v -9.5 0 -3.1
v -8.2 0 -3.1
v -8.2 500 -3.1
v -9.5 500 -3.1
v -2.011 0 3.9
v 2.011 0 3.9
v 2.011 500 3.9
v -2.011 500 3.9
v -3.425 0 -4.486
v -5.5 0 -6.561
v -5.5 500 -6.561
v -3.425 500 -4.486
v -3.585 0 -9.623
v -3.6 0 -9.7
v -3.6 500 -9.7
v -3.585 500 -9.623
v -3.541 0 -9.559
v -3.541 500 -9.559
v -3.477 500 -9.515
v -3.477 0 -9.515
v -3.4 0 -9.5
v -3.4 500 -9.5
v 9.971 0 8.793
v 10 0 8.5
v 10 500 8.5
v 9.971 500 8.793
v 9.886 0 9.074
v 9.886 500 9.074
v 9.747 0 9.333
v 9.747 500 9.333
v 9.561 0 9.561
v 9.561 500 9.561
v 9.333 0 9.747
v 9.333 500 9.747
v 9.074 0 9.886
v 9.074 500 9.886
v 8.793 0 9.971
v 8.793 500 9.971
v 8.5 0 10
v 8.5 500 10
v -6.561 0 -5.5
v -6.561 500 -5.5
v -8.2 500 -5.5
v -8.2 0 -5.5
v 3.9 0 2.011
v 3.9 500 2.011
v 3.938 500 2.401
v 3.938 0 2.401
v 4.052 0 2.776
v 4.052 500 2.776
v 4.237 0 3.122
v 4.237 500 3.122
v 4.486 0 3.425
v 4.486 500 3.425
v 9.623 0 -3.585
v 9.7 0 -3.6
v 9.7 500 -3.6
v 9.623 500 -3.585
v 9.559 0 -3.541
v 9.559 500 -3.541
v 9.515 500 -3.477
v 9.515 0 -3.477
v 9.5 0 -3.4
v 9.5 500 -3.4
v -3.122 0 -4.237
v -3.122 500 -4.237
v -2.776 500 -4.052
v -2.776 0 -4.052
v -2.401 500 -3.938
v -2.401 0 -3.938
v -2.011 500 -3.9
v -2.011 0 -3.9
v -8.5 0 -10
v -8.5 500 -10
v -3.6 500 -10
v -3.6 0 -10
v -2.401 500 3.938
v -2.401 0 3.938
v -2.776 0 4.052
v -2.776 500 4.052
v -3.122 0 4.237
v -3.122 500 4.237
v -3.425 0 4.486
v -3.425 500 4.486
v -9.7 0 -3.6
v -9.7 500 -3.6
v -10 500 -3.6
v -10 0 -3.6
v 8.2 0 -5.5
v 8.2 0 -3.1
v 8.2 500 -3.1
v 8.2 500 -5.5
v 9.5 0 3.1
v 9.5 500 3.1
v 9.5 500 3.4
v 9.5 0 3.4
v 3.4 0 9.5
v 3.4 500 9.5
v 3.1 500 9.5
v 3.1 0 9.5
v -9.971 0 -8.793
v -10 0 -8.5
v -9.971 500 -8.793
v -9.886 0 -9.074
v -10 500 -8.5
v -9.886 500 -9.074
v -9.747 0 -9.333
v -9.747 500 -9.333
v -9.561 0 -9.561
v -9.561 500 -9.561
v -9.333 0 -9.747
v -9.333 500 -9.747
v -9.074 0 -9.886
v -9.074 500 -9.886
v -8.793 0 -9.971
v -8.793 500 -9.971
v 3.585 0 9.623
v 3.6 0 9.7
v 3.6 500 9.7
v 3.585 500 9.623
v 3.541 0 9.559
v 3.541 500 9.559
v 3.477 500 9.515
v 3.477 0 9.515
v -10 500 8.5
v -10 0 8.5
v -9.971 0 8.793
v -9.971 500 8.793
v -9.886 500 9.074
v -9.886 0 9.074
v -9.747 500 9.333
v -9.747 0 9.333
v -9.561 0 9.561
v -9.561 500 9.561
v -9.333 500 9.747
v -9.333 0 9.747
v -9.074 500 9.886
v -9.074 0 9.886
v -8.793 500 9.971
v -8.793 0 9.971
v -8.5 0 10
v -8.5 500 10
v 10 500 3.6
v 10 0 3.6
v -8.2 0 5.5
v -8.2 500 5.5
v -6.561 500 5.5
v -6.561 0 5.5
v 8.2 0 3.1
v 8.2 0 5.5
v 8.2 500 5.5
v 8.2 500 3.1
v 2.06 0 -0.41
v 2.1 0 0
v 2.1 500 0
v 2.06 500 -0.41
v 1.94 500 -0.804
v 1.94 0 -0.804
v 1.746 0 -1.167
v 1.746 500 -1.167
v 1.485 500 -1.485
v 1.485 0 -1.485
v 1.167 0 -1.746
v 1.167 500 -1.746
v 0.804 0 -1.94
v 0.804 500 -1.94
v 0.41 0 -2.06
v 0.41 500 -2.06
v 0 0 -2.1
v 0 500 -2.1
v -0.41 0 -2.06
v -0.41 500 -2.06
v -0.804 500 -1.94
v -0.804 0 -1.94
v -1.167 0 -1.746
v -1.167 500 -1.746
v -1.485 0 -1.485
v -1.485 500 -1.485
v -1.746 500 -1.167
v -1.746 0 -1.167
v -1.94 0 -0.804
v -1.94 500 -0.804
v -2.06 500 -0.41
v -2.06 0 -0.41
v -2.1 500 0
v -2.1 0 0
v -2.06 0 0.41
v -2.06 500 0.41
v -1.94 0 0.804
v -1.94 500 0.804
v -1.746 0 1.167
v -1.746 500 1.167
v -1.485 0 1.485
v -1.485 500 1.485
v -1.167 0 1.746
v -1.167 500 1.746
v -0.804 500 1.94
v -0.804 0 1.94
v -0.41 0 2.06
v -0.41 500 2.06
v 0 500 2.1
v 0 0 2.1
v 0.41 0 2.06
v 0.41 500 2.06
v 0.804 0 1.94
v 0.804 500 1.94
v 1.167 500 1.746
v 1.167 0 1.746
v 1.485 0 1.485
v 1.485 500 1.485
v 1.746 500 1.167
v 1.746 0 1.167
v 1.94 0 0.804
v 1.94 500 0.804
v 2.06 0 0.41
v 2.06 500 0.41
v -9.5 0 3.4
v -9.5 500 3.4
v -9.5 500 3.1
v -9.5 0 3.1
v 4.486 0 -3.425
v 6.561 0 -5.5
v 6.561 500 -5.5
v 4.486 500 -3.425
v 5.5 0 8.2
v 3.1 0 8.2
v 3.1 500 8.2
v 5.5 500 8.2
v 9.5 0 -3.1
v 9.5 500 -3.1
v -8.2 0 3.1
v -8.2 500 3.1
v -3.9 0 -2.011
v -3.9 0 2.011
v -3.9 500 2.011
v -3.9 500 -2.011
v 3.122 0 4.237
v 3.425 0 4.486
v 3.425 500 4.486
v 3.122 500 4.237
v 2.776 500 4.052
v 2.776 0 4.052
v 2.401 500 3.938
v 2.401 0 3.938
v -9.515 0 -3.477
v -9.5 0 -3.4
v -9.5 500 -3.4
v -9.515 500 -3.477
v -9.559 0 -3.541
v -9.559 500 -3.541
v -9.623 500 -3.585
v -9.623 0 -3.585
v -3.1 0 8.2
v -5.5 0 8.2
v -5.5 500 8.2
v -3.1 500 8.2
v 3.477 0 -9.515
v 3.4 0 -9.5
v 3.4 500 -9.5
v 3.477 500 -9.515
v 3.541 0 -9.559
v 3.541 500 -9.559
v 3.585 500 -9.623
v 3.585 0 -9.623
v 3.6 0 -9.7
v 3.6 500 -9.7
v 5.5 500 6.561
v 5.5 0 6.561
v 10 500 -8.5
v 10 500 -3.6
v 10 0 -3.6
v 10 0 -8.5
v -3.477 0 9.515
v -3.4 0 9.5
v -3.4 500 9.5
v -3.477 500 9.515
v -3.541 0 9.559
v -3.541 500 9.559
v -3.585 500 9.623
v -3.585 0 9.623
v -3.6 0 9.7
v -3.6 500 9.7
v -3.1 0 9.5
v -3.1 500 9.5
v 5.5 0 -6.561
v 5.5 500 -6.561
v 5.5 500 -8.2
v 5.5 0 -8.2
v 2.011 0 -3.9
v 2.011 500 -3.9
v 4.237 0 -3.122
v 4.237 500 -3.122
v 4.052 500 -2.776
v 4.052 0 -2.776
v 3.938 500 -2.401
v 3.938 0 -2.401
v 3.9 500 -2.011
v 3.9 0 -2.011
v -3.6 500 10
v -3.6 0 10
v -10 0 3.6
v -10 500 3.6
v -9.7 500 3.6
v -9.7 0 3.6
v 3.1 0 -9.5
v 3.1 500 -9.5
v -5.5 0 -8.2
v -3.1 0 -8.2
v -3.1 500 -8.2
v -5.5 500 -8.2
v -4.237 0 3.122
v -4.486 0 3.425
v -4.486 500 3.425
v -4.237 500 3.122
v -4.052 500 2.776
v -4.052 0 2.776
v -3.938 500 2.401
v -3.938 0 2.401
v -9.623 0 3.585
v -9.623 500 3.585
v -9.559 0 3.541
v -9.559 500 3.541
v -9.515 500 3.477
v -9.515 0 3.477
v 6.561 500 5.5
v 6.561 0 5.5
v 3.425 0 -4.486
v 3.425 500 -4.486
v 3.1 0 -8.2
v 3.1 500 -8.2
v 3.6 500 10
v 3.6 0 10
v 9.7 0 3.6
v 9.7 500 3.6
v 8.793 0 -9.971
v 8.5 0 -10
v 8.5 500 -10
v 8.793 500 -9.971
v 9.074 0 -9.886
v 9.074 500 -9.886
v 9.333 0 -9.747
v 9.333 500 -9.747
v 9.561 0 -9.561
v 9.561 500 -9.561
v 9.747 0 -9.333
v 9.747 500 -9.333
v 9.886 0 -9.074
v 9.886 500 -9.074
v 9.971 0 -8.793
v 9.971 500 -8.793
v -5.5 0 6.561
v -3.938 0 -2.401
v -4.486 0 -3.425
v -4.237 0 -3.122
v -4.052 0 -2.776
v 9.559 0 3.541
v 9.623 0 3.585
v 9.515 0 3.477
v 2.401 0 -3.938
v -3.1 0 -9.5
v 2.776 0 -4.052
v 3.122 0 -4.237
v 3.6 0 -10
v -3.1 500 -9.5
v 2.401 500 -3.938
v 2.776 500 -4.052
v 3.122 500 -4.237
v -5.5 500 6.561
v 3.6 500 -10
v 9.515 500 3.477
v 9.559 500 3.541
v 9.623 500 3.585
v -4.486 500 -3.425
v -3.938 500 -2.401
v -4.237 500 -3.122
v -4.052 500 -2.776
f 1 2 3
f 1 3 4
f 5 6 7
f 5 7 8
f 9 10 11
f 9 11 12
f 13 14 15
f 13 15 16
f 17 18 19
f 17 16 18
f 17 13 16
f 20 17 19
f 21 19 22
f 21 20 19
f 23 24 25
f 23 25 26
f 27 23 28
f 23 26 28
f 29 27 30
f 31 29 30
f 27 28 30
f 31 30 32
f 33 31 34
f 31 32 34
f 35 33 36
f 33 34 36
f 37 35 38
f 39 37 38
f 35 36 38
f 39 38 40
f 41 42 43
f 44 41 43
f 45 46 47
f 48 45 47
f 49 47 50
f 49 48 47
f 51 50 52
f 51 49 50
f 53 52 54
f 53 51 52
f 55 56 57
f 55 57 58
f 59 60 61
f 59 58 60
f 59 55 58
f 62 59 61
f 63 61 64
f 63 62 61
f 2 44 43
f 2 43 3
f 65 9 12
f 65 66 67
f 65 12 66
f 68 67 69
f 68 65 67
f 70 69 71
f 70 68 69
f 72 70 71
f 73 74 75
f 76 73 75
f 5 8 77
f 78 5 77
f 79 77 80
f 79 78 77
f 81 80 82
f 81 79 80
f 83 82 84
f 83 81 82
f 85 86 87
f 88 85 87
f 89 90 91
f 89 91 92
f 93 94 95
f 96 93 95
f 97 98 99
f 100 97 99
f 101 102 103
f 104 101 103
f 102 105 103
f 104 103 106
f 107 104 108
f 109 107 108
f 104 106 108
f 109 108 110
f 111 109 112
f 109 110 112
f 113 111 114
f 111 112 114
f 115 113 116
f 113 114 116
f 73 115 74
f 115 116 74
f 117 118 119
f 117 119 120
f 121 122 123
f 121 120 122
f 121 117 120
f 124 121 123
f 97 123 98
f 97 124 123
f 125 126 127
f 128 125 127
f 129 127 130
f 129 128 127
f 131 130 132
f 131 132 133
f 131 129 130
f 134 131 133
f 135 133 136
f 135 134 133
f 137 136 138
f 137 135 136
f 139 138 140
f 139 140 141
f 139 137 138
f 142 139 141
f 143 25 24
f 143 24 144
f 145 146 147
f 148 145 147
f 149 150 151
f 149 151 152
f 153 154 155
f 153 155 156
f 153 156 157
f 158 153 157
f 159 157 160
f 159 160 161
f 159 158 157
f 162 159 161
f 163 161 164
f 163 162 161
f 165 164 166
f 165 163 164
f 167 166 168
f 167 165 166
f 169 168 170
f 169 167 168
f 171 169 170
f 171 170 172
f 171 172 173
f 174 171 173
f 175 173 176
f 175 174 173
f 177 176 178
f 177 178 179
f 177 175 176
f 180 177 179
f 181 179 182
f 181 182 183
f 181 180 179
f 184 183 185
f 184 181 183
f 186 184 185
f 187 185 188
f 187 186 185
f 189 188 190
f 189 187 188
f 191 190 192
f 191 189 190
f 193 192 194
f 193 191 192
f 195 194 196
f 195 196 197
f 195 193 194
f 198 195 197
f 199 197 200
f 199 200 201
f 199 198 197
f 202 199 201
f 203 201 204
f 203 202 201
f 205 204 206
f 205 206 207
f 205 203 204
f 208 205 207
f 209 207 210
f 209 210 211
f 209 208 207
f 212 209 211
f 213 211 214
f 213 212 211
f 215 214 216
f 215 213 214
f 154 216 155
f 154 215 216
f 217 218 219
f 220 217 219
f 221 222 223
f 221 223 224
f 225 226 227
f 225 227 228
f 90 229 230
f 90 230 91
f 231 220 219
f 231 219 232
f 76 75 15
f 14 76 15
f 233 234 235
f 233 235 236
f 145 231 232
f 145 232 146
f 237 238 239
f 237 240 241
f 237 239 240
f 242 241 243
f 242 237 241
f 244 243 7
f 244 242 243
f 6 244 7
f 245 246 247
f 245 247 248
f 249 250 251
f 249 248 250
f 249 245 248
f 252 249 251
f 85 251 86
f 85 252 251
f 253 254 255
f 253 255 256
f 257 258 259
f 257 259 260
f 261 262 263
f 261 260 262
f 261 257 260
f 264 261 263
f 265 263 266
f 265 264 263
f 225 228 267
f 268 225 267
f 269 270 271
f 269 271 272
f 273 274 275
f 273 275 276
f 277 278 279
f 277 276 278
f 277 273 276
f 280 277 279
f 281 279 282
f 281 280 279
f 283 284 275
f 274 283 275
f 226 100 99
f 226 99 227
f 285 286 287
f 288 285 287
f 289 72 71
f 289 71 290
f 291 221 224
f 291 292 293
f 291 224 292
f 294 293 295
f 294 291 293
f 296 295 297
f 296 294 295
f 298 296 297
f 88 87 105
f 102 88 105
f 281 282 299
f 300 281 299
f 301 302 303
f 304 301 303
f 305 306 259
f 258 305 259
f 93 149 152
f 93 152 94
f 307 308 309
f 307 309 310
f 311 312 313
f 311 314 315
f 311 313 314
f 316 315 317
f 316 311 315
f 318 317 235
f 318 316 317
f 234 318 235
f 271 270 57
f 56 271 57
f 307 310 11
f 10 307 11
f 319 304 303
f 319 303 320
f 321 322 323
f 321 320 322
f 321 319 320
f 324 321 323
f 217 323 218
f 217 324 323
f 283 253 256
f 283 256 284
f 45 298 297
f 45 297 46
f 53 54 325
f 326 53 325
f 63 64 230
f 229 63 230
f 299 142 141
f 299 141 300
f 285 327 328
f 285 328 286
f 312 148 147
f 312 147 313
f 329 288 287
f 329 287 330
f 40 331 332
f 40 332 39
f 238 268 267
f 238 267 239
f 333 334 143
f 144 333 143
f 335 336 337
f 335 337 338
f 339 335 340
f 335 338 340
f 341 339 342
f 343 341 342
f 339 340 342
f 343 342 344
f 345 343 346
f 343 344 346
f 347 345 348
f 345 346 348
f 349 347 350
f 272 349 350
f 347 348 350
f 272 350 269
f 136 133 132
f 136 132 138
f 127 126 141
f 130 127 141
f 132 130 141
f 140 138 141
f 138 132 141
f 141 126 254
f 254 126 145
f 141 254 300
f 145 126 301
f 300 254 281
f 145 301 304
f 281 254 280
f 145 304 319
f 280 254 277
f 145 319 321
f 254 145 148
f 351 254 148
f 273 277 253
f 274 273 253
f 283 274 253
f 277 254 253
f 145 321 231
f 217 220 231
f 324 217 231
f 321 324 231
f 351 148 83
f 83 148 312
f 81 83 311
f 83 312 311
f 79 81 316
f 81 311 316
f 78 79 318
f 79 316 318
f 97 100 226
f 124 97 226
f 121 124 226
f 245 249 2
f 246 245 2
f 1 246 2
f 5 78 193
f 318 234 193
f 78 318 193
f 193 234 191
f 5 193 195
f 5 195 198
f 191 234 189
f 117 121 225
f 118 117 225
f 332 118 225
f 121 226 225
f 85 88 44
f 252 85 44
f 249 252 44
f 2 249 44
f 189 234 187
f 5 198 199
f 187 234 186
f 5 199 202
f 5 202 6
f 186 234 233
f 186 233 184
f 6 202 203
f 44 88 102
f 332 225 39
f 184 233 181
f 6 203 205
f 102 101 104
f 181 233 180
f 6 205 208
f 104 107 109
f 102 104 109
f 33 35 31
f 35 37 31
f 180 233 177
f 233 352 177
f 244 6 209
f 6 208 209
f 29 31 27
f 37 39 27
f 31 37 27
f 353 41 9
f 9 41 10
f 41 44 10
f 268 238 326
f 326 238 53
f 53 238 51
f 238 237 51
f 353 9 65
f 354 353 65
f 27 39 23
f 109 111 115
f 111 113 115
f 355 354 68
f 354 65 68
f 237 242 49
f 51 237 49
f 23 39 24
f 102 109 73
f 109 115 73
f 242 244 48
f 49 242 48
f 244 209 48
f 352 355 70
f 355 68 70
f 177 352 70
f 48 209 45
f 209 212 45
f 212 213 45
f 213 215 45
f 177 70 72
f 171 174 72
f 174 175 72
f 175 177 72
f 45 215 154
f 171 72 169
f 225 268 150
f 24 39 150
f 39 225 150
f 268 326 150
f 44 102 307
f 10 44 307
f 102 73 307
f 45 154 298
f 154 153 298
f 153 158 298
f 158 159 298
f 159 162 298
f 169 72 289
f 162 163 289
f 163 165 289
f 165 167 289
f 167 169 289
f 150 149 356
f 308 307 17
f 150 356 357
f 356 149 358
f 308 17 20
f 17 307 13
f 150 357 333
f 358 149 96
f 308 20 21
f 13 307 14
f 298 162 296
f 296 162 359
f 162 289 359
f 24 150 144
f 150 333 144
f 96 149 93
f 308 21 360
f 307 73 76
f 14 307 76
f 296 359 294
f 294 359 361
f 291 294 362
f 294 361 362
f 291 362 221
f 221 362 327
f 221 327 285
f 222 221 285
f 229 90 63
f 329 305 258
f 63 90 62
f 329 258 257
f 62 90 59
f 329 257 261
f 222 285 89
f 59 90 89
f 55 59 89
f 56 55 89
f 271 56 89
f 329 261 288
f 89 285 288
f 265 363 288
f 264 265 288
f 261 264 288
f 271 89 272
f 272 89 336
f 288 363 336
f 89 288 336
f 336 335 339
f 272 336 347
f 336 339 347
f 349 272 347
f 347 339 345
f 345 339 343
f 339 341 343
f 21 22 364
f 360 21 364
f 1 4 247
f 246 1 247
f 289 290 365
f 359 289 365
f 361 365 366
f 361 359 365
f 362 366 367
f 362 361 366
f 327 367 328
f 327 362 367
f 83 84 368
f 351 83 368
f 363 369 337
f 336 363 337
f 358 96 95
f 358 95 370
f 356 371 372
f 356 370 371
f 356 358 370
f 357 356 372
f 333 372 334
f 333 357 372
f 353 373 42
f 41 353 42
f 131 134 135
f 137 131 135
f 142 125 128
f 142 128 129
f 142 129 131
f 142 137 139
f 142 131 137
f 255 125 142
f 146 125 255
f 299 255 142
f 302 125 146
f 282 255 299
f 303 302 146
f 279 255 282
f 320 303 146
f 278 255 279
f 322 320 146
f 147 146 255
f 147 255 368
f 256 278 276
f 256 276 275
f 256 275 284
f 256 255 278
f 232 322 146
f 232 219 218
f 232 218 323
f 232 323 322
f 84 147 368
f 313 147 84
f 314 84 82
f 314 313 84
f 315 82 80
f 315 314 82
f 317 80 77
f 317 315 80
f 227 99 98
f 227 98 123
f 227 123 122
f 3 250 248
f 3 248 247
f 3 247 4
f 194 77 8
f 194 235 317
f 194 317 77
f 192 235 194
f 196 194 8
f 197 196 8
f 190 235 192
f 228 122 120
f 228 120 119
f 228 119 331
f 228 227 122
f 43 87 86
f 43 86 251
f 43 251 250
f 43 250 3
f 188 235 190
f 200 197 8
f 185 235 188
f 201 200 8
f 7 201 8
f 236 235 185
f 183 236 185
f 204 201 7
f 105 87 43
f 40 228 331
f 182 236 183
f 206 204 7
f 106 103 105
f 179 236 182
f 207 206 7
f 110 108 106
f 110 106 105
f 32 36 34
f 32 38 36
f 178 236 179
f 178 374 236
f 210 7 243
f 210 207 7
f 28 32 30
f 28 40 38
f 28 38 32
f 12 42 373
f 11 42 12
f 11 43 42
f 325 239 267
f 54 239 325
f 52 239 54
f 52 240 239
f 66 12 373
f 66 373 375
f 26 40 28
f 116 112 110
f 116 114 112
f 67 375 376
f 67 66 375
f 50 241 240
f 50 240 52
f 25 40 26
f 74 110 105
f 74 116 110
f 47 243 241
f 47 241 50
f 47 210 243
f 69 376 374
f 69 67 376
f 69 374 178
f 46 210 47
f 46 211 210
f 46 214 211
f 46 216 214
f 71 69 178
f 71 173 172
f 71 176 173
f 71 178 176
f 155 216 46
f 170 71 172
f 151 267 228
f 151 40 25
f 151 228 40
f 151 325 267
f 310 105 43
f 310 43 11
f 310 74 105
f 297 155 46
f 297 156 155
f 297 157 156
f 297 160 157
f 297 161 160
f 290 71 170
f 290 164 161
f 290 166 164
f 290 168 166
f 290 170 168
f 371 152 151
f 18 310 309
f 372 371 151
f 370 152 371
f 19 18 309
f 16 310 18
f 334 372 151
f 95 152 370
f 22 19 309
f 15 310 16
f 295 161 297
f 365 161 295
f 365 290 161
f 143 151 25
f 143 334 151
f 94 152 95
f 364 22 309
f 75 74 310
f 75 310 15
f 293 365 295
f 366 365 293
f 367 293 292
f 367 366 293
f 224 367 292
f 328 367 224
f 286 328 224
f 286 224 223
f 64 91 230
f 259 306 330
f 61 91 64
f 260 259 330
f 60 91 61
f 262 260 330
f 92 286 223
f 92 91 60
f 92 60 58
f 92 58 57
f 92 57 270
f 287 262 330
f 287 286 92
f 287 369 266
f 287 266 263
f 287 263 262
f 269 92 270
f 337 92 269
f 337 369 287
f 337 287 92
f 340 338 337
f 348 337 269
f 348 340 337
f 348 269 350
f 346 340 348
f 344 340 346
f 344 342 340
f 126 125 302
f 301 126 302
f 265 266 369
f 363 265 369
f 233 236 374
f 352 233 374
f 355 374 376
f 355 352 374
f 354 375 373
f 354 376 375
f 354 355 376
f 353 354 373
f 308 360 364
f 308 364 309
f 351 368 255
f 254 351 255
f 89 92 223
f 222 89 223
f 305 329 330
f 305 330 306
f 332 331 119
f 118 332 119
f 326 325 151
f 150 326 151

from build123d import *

# Parameters (mm, degrees)
SKETCH1_W           = 20
SKETCH1_H           = 20
SKETCH1_R           = 2.1
BOSS_EXTRUDE1_DEPTH = 500
CUT_EXTRUDE1_START  = -501
CUT_EXTRUDE1_DEPTH  = 502
CIRPATTERN1_COUNT   = 4
FILLET1_R           = 1.5


with BuildPart() as part:
    # Sketch1 → Boss-Extrude1 (new body)
    with BuildSketch(Plane(origin=(0, 0, 0), x_dir=(1, 0, 0), z_dir=(0, 1, 0))):
        Rectangle(SKETCH1_W, SKETCH1_H)
        Circle(SKETCH1_R, mode=Mode.SUBTRACT)
    extrude(amount=BOSS_EXTRUDE1_DEPTH)

    # Sketch2 → Cut-Extrude1 (cut)
    with BuildSketch(Plane(origin=(0, 500, 0), x_dir=(1, 0, 0), z_dir=(0, 1, 0)).offset(CUT_EXTRUDE1_START)):
        with BuildLine():
            Line((-2.010912703, 3.9), (2.010912703, 3.9))
            ThreePointArc((2.010912703, 3.9), (2.776279568, 4.052240935), (3.425126266, 4.485786438))
            Line((3.425126266, 4.485786438), (5.5, 6.560660172))
            Line((5.5, 6.560660172), (5.5, 8.2))
            Line((5.5, 8.2), (3.1, 8.2))
            Line((3.1, 8.2), (3.1, 9.5))
            Line((3.1, 9.5), (3.4, 9.5))
            ThreePointArc((3.4, 9.5), (3.541421356, 9.558578644), (3.6, 9.7))
            Line((3.6, 9.7), (3.6, 10))
            Line((3.6, 10), (-3.6, 10))
            Line((-3.6, 10), (-3.6, 9.7))
            ThreePointArc((-3.6, 9.7), (-3.541421356, 9.558578644), (-3.4, 9.5))
            Line((-3.4, 9.5), (-3.1, 9.5))
            Line((-3.1, 9.5), (-3.1, 8.2))
            Line((-3.1, 8.2), (-5.5, 8.2))
            Line((-5.5, 8.2), (-5.5, 6.560660172))
            Line((-5.5, 6.560660172), (-3.425126266, 4.485786438))
            ThreePointArc((-3.425126266, 4.485786438), (-2.776279568, 4.052240935), (-2.010912703, 3.9))
        make_face()
    cut_extrude1 = extrude(amount=CUT_EXTRUDE1_DEPTH, mode=Mode.SUBTRACT)

    # CirPattern1: Cut-Extrude1 ×4 about axis
    cirpattern1_axis = Axis((0, 0, 0), (0, 1, 0))
    for i in range(1, CIRPATTERN1_COUNT):
        add(cut_extrude1.rotate(cirpattern1_axis, i * 360 / CIRPATTERN1_COUNT), mode=Mode.SUBTRACT)

    # Fillet1
    fillet1_edges = [part.edges().sort_by_distance(p)[0] for p in [
        (10, 250, 10),
        (-10, 250, 10),
        (-10, 250, -10),
        (10, 250, -10),
    ]]
    fillet(fillet1_edges, radius=FILLET1_R)


solid = part.part
